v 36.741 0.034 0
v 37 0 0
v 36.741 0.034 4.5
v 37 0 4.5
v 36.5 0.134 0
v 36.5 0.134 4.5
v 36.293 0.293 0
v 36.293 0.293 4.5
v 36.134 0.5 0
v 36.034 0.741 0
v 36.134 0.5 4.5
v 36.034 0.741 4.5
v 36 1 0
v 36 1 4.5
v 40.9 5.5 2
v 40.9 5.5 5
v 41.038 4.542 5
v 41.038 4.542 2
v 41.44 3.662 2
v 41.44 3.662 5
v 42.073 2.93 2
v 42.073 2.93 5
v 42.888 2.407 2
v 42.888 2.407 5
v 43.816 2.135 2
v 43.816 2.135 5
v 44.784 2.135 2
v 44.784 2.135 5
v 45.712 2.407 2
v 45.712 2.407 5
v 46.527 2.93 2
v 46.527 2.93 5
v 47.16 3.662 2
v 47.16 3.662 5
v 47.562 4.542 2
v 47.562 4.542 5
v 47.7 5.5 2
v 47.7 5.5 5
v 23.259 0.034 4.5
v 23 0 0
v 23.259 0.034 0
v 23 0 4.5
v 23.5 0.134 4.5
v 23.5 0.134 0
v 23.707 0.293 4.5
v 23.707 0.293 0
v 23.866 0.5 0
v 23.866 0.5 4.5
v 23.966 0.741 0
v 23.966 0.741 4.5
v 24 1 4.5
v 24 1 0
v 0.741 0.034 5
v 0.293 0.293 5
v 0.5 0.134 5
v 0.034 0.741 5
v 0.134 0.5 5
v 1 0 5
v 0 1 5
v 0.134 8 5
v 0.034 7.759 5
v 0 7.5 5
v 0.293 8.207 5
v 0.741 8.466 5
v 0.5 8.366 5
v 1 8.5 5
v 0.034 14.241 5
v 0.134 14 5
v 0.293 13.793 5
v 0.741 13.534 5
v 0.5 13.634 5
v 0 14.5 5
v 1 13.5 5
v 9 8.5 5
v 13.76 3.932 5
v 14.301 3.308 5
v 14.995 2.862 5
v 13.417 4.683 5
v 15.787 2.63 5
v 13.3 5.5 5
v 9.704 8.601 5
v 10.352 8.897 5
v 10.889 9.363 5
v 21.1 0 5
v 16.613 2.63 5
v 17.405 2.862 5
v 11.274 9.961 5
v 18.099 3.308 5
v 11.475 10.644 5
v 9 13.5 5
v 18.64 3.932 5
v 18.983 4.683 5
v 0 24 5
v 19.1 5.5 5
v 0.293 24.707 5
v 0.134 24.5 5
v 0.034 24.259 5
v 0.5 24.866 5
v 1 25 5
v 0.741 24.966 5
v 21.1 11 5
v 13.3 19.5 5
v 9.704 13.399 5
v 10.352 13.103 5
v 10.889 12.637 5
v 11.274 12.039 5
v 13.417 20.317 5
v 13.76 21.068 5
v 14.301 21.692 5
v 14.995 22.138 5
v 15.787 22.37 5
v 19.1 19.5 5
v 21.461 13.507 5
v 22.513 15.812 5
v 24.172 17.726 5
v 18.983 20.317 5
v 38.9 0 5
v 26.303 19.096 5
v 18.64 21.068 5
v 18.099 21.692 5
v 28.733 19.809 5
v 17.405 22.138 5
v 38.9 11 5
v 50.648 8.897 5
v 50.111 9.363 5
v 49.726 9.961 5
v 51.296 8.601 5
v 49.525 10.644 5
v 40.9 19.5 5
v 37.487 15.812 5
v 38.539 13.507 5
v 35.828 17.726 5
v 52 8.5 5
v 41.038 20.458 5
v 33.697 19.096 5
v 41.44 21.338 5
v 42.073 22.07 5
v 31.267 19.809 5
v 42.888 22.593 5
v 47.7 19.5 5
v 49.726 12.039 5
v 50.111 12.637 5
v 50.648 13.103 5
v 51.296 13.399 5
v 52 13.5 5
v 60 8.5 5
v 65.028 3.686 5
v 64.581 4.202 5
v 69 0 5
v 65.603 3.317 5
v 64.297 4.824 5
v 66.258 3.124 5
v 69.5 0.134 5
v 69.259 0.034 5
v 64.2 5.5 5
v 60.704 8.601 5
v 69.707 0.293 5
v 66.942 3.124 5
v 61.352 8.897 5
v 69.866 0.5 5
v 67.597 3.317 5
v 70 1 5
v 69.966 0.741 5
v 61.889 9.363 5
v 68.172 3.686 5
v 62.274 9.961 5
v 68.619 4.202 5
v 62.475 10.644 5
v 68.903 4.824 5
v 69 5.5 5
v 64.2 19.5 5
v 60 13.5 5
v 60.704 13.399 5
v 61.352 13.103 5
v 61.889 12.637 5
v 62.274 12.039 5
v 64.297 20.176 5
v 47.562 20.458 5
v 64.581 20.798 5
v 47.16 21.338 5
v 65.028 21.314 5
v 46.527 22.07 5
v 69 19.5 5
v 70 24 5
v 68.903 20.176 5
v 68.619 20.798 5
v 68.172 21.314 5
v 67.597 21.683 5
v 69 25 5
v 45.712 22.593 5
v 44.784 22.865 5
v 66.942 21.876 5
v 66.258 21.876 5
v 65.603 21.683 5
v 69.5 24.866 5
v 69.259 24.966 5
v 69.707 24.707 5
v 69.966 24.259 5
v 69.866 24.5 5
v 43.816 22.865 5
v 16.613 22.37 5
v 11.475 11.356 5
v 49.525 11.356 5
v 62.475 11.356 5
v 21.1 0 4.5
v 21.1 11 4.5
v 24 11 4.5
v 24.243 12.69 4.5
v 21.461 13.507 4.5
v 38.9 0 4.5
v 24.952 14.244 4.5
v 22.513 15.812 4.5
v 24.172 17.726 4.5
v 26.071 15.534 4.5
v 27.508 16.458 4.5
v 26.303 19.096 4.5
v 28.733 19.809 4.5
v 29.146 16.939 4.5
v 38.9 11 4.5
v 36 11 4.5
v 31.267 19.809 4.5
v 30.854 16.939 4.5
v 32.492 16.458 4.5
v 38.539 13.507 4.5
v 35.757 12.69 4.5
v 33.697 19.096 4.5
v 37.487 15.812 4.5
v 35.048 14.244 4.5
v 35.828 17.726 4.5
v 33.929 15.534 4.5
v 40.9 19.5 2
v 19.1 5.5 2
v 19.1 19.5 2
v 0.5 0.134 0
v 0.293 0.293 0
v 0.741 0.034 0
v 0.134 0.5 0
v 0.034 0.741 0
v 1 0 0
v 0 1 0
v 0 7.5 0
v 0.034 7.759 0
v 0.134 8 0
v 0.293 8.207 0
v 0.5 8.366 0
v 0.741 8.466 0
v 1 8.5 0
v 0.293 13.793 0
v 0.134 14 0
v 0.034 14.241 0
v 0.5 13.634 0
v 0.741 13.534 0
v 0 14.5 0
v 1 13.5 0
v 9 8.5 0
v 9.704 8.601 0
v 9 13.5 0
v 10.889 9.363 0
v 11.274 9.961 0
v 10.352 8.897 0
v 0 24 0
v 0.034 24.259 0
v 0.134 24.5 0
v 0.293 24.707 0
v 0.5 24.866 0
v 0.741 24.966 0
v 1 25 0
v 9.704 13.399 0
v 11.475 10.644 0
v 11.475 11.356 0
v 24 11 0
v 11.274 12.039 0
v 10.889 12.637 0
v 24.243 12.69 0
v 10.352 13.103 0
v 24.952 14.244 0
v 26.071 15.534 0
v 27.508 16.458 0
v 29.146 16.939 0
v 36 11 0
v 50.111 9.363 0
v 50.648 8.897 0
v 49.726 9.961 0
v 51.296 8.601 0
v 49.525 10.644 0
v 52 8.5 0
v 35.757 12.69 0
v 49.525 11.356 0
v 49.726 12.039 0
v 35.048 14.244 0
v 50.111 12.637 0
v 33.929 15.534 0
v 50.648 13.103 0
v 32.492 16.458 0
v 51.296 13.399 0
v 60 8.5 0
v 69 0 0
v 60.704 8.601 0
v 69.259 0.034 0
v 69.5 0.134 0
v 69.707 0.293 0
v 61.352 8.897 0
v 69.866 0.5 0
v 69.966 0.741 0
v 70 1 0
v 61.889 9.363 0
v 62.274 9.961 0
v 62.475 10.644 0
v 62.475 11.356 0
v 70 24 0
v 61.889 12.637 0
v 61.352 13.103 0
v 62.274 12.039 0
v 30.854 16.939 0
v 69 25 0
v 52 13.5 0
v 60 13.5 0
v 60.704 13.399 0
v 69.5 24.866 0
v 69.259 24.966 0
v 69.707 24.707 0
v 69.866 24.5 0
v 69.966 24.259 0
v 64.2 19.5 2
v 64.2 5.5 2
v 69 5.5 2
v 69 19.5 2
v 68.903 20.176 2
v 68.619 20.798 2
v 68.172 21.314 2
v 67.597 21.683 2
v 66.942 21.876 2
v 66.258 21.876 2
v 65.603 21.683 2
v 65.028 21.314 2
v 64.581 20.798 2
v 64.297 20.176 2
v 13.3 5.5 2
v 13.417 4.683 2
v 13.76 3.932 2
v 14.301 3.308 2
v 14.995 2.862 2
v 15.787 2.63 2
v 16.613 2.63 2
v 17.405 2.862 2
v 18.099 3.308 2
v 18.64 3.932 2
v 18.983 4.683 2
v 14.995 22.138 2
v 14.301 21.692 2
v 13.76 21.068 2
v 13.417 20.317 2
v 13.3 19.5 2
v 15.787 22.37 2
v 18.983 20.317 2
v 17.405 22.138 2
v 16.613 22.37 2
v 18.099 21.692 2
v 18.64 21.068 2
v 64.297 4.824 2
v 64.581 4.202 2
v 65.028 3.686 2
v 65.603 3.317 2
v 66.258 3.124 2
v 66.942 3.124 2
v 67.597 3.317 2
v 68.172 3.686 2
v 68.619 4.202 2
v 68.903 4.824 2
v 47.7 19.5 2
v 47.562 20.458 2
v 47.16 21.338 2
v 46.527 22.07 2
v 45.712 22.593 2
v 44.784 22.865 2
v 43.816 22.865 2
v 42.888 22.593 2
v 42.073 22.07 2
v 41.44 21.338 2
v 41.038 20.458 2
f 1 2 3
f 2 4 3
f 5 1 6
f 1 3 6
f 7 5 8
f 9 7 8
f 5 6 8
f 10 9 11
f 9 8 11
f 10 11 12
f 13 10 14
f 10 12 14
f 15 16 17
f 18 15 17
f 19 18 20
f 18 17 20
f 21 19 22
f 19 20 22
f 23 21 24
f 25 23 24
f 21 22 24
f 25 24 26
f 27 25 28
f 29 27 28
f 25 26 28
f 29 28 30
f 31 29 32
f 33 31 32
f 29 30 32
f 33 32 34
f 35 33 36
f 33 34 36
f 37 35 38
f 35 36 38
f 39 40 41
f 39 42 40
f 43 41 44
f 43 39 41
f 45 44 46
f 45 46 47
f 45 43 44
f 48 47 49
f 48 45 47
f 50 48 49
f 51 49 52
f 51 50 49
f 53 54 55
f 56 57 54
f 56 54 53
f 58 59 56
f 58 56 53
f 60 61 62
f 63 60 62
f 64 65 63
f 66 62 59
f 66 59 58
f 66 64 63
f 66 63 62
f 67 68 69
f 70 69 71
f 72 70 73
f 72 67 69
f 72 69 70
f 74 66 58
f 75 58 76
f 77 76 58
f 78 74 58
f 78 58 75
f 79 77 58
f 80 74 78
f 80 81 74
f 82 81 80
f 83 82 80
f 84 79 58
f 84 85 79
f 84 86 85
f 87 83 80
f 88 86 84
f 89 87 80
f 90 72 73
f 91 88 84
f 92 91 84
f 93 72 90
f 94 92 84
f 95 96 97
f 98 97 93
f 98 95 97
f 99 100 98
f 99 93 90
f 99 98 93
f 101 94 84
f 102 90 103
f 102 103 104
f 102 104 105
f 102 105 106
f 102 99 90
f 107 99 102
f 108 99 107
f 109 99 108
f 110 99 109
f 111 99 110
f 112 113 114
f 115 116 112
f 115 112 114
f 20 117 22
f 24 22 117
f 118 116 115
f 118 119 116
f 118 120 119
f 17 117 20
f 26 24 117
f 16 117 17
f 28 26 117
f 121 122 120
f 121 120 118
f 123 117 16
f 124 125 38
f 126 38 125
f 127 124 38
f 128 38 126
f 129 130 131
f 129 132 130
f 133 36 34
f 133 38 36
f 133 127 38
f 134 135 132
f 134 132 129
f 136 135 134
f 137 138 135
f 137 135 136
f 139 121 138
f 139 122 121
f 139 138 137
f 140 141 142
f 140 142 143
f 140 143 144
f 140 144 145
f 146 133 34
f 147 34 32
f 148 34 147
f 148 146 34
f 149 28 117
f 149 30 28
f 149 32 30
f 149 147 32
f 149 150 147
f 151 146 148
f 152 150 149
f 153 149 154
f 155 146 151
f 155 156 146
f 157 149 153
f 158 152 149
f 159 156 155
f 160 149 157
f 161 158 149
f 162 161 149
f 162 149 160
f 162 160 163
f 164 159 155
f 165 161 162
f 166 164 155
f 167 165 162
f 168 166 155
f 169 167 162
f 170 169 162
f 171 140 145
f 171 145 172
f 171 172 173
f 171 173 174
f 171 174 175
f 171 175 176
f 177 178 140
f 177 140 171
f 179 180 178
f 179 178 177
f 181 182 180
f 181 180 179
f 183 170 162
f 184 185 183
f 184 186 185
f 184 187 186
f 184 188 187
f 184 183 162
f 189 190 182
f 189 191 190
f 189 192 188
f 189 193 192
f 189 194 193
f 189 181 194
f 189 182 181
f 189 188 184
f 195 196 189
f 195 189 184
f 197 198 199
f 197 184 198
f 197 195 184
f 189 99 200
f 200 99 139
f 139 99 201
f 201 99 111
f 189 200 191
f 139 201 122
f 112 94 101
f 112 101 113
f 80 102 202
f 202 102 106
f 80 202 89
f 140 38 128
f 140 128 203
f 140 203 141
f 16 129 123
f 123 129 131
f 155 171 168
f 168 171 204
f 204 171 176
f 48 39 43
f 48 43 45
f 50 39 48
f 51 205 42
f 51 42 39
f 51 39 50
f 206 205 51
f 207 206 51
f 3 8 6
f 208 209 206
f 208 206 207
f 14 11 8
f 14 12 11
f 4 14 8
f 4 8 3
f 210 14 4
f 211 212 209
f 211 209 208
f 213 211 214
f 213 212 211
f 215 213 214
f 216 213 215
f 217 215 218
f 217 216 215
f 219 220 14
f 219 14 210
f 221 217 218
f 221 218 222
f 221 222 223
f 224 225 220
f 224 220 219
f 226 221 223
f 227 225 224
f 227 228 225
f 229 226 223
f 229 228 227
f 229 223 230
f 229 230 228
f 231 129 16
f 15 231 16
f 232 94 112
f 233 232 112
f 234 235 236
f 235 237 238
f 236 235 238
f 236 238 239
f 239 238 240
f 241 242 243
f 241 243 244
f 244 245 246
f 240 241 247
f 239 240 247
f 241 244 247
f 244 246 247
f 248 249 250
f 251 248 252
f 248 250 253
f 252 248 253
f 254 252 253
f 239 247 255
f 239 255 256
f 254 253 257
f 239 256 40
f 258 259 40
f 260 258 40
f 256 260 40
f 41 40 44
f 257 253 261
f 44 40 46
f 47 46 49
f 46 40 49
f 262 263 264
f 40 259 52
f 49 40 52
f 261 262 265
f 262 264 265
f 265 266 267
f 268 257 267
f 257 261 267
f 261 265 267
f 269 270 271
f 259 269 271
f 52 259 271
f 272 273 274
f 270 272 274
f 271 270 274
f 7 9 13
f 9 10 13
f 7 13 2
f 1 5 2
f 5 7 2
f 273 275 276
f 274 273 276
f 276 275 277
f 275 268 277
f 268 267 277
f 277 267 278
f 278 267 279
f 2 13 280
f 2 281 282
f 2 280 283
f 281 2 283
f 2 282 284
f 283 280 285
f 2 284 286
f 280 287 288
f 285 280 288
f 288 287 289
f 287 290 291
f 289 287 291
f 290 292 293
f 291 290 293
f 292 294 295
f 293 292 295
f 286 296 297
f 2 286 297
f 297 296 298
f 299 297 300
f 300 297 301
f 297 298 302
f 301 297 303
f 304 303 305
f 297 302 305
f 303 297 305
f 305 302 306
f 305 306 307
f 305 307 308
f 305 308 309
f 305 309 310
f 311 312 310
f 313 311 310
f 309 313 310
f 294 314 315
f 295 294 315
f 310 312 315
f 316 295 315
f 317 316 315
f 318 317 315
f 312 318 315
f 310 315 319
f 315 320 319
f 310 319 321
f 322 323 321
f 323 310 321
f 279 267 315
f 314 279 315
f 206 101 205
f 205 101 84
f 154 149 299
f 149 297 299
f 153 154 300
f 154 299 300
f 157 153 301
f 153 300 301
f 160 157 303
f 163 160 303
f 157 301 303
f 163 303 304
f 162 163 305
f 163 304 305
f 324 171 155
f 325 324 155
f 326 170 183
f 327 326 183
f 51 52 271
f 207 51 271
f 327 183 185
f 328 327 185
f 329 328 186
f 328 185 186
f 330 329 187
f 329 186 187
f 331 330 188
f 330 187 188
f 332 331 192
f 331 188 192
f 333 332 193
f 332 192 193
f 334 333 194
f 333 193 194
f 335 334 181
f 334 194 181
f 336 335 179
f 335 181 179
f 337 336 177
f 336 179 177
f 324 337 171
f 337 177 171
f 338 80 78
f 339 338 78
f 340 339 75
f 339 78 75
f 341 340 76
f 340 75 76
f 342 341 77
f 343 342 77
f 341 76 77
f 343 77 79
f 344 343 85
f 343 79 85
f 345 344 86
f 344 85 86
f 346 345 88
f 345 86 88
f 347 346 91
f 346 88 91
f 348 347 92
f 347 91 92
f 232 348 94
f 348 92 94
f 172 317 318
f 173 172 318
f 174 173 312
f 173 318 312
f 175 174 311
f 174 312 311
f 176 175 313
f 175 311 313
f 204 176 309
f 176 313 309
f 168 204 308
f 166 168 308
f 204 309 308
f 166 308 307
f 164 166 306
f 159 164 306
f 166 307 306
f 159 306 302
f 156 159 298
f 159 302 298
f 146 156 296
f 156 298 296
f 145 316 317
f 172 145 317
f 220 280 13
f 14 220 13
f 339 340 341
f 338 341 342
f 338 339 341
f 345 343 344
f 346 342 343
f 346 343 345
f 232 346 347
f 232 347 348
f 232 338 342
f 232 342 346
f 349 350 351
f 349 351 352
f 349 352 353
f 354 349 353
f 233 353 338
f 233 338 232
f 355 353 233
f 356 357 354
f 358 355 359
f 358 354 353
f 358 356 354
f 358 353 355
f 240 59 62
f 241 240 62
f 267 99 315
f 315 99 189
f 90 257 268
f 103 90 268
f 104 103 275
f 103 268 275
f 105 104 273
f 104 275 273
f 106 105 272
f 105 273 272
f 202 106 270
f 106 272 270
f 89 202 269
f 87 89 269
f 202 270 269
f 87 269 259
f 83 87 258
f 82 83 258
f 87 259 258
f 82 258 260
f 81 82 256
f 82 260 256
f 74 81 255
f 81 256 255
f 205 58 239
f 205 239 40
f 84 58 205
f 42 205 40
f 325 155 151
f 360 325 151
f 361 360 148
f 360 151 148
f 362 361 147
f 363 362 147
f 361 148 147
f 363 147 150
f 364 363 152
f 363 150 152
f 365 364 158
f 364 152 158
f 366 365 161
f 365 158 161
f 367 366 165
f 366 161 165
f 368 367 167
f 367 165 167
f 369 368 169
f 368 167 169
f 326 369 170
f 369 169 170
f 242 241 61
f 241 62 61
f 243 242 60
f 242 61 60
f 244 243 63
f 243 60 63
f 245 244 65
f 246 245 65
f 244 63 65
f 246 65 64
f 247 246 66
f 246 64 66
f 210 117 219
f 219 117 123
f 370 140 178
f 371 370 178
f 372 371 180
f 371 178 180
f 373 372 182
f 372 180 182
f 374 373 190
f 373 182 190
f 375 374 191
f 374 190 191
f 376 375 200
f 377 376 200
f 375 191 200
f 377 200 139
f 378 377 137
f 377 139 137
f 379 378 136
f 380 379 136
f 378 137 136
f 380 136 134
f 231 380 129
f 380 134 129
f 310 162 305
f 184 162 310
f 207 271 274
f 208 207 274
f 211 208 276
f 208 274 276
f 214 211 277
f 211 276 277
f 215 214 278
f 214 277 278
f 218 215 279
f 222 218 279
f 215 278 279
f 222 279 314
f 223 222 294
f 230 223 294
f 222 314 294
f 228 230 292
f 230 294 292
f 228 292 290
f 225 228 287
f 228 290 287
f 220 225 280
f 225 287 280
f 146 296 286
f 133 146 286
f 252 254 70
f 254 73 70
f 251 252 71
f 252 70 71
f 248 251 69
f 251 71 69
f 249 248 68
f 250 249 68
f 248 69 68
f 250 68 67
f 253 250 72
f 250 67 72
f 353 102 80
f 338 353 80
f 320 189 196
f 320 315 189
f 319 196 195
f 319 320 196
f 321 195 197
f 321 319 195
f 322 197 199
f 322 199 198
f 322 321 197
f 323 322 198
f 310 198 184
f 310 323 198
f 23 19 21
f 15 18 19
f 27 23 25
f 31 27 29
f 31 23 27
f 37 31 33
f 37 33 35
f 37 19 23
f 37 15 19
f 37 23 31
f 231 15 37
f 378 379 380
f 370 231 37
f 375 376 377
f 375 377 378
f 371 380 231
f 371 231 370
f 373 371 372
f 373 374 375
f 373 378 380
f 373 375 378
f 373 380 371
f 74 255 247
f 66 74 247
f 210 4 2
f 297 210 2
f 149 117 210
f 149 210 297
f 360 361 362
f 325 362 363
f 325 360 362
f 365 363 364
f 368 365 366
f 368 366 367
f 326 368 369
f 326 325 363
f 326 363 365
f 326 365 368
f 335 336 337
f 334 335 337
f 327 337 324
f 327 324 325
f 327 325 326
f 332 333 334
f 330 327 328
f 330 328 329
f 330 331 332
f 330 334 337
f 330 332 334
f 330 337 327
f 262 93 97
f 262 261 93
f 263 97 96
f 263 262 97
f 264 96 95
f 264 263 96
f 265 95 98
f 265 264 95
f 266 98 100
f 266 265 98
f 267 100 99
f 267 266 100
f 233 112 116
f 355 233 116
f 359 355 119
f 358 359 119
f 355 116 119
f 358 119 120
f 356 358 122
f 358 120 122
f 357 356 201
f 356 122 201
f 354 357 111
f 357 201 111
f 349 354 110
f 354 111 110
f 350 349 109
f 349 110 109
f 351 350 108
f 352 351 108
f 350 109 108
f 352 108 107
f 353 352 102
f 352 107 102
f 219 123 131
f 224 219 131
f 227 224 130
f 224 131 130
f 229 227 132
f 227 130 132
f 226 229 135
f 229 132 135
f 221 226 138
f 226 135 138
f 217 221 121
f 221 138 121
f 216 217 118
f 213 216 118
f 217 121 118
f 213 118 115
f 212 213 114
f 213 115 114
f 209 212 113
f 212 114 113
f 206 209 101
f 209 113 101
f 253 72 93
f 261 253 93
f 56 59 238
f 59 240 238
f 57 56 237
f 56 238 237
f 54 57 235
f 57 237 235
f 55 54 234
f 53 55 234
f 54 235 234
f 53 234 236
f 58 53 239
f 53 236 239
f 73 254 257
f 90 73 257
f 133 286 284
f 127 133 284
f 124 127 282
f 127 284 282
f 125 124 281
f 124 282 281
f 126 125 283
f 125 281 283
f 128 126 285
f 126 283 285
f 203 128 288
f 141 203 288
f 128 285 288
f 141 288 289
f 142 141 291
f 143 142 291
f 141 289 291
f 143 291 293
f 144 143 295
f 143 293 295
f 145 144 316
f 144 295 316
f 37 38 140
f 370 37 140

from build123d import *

# Parameters (mm, degrees)
SKETCH1_W           = 70
SKETCH1_H           = 25
BOSS_EXTRUDE1_DEPTH = 5
CUT_EXTRUDE1_DEPTH  = 0.5
CUT_EXTRUDE2_DEPTH  = 75.498322129
CUT_EXTRUDE3_DEPTH  = 75.498322129
CUT_EXTRUDE4_DEPTH  = 75.498322129
CUT_EXTRUDE5_DEPTH  = 3
CUT_EXTRUDE6_DEPTH  = 3
CUT_EXTRUDE7_DEPTH  = 3
FILLET1_R           = 1


with BuildPart() as part:
    # Sketch1 → Boss-Extrude1 (new body)
    with BuildSketch(Plane.XY.offset(5)):
        with Locations((35, 12.5)):
            Rectangle(SKETCH1_W, SKETCH1_H)
    extrude(amount=-BOSS_EXTRUDE1_DEPTH)

    # Sketch2 → Cut-Extrude1 (cut)
    with BuildSketch(Plane.XY.offset(5)):
        with BuildLine():
            Line((38.9, 0), (38.9, 11))
            ThreePointArc((38.9, 11), (30, 19.9), (21.1, 11))
            Line((21.1, 11), (21.1, 0))
            Line((21.1, 0), (38.9, 0))
        make_face()
    extrude(amount=-CUT_EXTRUDE1_DEPTH, mode=Mode.SUBTRACT)

    # Sketch3 → Cut-Extrude2 (cut, through all)
    with BuildSketch(Plane(origin=(0, 0, 0), x_dir=(-1, 0, 0), z_dir=(0, 0, -1))):
        with BuildLine():
            Line((-36, 0), (-24, 0))
            Line((-24, 0), (-24, 11))
            ThreePointArc((-24, 11), (-30, 17), (-36, 11))
            Line((-36, 11), (-36, 0))
        make_face()
    extrude(amount=-CUT_EXTRUDE2_DEPTH, mode=Mode.SUBTRACT)

    # Sketch4 → Cut-Extrude3 (cut, through all)
    with BuildSketch(Plane(origin=(0, 0, 0), x_dir=(-1, 0, 0), z_dir=(0, 0, -1))):
        with BuildLine():
            Line((0, 8.5), (0, 13.5))
            Line((0, 13.5), (-9, 13.5))
            ThreePointArc((-9, 13.5), (-11.5, 11), (-9, 8.5))
            Line((-9, 8.5), (0, 8.5))
        make_face()
    extrude(amount=-CUT_EXTRUDE3_DEPTH, mode=Mode.SUBTRACT)

    # Sketch5 → Cut-Extrude4 (cut, through all)
    with BuildSketch(Plane(origin=(0, 0, 0), x_dir=(-1, 0, 0), z_dir=(0, 0, -1))):
        with BuildLine():
            Line((-52, 13.5), (-60, 13.5))
            ThreePointArc((-60, 13.5), (-62.5, 11), (-60, 8.5))
            Line((-60, 8.5), (-52, 8.5))
            ThreePointArc((-52, 8.5), (-49.5, 11), (-52, 13.5))
        make_face()
    extrude(amount=-CUT_EXTRUDE4_DEPTH, mode=Mode.SUBTRACT)

    # Sketch6 → Cut-Extrude5 (cut)
    with BuildSketch(Plane.XY.offset(5)):
        with BuildLine():
            Line((69, 5.5), (69, 19.5))
            ThreePointArc((69, 19.5), (66.6, 21.9), (64.2, 19.5))
            Line((64.2, 19.5), (64.2, 5.5))
            ThreePointArc((64.2, 5.5), (66.6, 3.1), (69, 5.5))
        make_face()
    extrude(amount=-CUT_EXTRUDE5_DEPTH, mode=Mode.SUBTRACT)

    # Sketch7 → Cut-Extrude6 (cut)
    with BuildSketch(Plane.XY.offset(5)):
        with BuildLine():
            Line((47.7, 5.5), (47.7, 19.5))
            ThreePointArc((47.7, 19.5), (44.3, 22.9), (40.9, 19.5))
            Line((40.9, 19.5), (40.9, 5.5))
            ThreePointArc((40.9, 5.5), (44.3, 2.1), (47.7, 5.5))
        make_face()
    extrude(amount=-CUT_EXTRUDE6_DEPTH, mode=Mode.SUBTRACT)

    # Sketch8 → Cut-Extrude7 (cut)
    with BuildSketch(Plane.XY.offset(5)):
        with BuildLine():
            Line((19.1, 5.5), (19.1, 19.5))
            ThreePointArc((19.1, 19.5), (16.2, 22.4), (13.3, 19.5))
            Line((13.3, 19.5), (13.3, 5.5))
            ThreePointArc((13.3, 5.5), (16.2, 2.6), (19.1, 5.5))
        make_face()
    extrude(amount=-CUT_EXTRUDE7_DEPTH, mode=Mode.SUBTRACT)

    # Fillet1
    fillet1_edges = [part.edges().sort_by_distance(p)[0] for p in [
        (36, 0, 2.25),
        (24, 0, 2.25),
        (0, 8.5, 2.5),
        (0, 13.5, 2.5),
        (70, 25, 2.5),
        (70, 0, 2.5),
        (0, 0, 2.5),
        (0, 25, 2.5),
    ]]
    fillet(fillet1_edges, radius=FILLET1_R)


solid = part.part
